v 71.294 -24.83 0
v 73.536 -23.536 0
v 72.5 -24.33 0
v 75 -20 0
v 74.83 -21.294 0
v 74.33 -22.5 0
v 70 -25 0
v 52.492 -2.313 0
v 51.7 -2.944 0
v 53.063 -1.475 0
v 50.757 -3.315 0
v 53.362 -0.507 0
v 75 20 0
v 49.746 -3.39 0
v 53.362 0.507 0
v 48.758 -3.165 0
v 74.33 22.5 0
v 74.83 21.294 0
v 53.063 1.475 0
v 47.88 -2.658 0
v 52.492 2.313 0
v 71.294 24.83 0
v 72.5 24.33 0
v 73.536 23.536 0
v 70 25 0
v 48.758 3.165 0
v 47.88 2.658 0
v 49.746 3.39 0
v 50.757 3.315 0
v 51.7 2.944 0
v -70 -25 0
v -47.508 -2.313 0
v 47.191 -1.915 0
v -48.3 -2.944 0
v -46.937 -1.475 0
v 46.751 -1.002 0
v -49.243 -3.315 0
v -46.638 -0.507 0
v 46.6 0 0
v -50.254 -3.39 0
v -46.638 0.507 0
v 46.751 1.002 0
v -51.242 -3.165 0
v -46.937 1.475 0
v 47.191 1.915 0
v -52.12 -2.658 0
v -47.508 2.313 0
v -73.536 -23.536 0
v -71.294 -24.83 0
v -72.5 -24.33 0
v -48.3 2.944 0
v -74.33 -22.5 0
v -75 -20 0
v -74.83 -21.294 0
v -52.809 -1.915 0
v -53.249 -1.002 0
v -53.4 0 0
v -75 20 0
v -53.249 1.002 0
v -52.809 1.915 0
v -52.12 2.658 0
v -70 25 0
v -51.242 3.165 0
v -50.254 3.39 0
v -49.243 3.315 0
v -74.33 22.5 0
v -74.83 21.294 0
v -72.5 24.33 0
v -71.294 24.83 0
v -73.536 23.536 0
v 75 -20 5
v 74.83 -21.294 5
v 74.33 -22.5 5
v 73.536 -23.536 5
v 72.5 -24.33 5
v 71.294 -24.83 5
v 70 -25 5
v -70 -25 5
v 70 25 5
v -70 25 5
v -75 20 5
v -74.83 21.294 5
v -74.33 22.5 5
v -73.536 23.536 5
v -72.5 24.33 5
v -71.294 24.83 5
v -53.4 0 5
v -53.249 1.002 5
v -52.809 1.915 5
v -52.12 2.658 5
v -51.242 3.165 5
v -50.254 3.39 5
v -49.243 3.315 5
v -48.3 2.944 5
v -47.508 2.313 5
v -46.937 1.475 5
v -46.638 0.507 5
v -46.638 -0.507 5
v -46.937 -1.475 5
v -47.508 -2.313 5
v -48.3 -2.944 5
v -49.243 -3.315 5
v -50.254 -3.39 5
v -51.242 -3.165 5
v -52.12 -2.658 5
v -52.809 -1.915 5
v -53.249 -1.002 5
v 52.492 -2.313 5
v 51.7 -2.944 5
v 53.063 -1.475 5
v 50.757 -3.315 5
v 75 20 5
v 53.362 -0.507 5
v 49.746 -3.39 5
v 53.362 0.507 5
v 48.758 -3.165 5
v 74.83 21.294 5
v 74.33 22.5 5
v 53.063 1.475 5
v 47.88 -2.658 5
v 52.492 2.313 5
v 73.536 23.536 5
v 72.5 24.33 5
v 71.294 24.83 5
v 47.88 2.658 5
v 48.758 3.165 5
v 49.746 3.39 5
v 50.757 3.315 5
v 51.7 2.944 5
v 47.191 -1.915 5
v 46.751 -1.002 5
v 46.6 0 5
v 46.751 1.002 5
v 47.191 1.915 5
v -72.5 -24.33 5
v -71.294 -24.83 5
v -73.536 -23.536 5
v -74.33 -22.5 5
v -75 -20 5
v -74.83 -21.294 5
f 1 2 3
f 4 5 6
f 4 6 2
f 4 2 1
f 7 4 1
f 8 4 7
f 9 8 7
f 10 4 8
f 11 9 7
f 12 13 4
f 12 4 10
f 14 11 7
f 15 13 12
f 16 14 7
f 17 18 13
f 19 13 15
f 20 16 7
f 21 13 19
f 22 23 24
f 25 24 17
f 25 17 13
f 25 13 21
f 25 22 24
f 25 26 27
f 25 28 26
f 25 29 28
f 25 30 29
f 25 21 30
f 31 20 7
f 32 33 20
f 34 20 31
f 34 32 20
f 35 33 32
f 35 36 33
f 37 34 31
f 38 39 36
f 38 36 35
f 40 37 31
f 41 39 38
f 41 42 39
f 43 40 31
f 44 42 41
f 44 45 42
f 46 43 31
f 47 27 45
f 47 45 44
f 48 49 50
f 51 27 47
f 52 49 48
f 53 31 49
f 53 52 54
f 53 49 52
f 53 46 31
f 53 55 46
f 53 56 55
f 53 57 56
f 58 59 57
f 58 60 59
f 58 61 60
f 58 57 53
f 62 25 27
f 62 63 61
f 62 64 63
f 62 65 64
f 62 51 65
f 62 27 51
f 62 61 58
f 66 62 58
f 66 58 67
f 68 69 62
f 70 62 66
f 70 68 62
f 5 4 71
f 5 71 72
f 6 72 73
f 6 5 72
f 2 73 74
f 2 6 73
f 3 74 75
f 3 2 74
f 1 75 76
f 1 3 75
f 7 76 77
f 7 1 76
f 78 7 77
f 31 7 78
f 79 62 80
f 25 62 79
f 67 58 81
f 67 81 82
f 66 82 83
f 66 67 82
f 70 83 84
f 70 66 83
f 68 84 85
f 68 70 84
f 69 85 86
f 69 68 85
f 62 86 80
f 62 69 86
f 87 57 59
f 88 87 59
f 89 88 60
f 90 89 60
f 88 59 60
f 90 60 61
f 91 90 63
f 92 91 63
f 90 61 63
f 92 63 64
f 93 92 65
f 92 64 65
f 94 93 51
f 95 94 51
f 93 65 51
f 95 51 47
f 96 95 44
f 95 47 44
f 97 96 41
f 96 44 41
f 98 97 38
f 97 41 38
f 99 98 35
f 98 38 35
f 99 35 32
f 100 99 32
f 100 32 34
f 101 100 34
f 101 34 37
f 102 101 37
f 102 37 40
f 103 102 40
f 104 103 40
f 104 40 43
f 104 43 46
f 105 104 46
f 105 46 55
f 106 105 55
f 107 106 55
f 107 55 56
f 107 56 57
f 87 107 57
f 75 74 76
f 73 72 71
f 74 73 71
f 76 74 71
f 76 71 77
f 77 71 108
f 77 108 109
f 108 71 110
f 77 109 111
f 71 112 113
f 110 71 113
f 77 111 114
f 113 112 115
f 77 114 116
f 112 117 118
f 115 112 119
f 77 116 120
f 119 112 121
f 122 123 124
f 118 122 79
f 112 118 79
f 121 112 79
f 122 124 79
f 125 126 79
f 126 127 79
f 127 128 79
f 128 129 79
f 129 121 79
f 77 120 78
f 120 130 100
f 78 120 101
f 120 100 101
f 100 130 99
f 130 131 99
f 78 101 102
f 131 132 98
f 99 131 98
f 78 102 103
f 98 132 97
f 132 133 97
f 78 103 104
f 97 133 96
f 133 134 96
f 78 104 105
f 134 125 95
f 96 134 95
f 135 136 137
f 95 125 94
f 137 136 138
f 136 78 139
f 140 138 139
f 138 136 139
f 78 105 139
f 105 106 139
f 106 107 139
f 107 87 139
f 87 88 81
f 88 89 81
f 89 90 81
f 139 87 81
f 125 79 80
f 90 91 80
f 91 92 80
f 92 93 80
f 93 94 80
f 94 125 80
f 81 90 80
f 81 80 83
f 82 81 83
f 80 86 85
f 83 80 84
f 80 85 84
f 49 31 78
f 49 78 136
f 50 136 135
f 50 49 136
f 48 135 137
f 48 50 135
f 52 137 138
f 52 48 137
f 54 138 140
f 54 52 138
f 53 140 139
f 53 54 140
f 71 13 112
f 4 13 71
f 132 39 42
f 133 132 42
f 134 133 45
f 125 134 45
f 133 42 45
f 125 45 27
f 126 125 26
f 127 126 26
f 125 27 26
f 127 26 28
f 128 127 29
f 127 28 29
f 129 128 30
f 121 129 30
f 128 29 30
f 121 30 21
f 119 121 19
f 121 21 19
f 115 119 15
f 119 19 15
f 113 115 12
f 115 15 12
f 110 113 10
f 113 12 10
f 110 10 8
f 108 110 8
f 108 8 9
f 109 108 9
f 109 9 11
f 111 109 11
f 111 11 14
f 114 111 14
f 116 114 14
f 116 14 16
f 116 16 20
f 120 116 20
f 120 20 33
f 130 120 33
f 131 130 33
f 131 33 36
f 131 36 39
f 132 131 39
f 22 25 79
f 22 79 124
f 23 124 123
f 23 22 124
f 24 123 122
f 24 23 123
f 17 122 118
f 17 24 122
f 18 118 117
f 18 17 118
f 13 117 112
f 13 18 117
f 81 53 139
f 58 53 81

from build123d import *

# Parameters (mm, degrees)
EXTRUDE_1_DEPTH    = 5
HOLE_WIZARD_M8_2_D = 6.8


with BuildPart() as part:
    # 草图1 → 凸台-拉伸1 (new body)
    with BuildSketch(Plane.XY):
        with BuildLine():
            Line((-70, 25), (70, 25))
            ThreePointArc((70, 25), (73.535533906, 23.535533906), (75, 20))
            Line((75, 20), (75, -20))
            ThreePointArc((75, -20), (73.535533906, -23.535533906), (70, -25))
            Line((70, -25), (-70, -25))
            ThreePointArc((-70, -25), (-73.535533906, -23.535533906), (-75, -20))
            Line((-75, -20), (-75, 20))
            ThreePointArc((-75, 20), (-73.535533906, 23.535533906), (-70, 25))
        make_face()
    extrude(amount=EXTRUDE_1_DEPTH)

    # M8 螺纹槽口的螺纹槽口钻头2 (through all)
    with Locations(Plane.XY.offset(5)):
        with Locations((-50, 0), (50, 0)):
            Hole(HOLE_WIZARD_M8_2_D / 2)


solid = part.part
